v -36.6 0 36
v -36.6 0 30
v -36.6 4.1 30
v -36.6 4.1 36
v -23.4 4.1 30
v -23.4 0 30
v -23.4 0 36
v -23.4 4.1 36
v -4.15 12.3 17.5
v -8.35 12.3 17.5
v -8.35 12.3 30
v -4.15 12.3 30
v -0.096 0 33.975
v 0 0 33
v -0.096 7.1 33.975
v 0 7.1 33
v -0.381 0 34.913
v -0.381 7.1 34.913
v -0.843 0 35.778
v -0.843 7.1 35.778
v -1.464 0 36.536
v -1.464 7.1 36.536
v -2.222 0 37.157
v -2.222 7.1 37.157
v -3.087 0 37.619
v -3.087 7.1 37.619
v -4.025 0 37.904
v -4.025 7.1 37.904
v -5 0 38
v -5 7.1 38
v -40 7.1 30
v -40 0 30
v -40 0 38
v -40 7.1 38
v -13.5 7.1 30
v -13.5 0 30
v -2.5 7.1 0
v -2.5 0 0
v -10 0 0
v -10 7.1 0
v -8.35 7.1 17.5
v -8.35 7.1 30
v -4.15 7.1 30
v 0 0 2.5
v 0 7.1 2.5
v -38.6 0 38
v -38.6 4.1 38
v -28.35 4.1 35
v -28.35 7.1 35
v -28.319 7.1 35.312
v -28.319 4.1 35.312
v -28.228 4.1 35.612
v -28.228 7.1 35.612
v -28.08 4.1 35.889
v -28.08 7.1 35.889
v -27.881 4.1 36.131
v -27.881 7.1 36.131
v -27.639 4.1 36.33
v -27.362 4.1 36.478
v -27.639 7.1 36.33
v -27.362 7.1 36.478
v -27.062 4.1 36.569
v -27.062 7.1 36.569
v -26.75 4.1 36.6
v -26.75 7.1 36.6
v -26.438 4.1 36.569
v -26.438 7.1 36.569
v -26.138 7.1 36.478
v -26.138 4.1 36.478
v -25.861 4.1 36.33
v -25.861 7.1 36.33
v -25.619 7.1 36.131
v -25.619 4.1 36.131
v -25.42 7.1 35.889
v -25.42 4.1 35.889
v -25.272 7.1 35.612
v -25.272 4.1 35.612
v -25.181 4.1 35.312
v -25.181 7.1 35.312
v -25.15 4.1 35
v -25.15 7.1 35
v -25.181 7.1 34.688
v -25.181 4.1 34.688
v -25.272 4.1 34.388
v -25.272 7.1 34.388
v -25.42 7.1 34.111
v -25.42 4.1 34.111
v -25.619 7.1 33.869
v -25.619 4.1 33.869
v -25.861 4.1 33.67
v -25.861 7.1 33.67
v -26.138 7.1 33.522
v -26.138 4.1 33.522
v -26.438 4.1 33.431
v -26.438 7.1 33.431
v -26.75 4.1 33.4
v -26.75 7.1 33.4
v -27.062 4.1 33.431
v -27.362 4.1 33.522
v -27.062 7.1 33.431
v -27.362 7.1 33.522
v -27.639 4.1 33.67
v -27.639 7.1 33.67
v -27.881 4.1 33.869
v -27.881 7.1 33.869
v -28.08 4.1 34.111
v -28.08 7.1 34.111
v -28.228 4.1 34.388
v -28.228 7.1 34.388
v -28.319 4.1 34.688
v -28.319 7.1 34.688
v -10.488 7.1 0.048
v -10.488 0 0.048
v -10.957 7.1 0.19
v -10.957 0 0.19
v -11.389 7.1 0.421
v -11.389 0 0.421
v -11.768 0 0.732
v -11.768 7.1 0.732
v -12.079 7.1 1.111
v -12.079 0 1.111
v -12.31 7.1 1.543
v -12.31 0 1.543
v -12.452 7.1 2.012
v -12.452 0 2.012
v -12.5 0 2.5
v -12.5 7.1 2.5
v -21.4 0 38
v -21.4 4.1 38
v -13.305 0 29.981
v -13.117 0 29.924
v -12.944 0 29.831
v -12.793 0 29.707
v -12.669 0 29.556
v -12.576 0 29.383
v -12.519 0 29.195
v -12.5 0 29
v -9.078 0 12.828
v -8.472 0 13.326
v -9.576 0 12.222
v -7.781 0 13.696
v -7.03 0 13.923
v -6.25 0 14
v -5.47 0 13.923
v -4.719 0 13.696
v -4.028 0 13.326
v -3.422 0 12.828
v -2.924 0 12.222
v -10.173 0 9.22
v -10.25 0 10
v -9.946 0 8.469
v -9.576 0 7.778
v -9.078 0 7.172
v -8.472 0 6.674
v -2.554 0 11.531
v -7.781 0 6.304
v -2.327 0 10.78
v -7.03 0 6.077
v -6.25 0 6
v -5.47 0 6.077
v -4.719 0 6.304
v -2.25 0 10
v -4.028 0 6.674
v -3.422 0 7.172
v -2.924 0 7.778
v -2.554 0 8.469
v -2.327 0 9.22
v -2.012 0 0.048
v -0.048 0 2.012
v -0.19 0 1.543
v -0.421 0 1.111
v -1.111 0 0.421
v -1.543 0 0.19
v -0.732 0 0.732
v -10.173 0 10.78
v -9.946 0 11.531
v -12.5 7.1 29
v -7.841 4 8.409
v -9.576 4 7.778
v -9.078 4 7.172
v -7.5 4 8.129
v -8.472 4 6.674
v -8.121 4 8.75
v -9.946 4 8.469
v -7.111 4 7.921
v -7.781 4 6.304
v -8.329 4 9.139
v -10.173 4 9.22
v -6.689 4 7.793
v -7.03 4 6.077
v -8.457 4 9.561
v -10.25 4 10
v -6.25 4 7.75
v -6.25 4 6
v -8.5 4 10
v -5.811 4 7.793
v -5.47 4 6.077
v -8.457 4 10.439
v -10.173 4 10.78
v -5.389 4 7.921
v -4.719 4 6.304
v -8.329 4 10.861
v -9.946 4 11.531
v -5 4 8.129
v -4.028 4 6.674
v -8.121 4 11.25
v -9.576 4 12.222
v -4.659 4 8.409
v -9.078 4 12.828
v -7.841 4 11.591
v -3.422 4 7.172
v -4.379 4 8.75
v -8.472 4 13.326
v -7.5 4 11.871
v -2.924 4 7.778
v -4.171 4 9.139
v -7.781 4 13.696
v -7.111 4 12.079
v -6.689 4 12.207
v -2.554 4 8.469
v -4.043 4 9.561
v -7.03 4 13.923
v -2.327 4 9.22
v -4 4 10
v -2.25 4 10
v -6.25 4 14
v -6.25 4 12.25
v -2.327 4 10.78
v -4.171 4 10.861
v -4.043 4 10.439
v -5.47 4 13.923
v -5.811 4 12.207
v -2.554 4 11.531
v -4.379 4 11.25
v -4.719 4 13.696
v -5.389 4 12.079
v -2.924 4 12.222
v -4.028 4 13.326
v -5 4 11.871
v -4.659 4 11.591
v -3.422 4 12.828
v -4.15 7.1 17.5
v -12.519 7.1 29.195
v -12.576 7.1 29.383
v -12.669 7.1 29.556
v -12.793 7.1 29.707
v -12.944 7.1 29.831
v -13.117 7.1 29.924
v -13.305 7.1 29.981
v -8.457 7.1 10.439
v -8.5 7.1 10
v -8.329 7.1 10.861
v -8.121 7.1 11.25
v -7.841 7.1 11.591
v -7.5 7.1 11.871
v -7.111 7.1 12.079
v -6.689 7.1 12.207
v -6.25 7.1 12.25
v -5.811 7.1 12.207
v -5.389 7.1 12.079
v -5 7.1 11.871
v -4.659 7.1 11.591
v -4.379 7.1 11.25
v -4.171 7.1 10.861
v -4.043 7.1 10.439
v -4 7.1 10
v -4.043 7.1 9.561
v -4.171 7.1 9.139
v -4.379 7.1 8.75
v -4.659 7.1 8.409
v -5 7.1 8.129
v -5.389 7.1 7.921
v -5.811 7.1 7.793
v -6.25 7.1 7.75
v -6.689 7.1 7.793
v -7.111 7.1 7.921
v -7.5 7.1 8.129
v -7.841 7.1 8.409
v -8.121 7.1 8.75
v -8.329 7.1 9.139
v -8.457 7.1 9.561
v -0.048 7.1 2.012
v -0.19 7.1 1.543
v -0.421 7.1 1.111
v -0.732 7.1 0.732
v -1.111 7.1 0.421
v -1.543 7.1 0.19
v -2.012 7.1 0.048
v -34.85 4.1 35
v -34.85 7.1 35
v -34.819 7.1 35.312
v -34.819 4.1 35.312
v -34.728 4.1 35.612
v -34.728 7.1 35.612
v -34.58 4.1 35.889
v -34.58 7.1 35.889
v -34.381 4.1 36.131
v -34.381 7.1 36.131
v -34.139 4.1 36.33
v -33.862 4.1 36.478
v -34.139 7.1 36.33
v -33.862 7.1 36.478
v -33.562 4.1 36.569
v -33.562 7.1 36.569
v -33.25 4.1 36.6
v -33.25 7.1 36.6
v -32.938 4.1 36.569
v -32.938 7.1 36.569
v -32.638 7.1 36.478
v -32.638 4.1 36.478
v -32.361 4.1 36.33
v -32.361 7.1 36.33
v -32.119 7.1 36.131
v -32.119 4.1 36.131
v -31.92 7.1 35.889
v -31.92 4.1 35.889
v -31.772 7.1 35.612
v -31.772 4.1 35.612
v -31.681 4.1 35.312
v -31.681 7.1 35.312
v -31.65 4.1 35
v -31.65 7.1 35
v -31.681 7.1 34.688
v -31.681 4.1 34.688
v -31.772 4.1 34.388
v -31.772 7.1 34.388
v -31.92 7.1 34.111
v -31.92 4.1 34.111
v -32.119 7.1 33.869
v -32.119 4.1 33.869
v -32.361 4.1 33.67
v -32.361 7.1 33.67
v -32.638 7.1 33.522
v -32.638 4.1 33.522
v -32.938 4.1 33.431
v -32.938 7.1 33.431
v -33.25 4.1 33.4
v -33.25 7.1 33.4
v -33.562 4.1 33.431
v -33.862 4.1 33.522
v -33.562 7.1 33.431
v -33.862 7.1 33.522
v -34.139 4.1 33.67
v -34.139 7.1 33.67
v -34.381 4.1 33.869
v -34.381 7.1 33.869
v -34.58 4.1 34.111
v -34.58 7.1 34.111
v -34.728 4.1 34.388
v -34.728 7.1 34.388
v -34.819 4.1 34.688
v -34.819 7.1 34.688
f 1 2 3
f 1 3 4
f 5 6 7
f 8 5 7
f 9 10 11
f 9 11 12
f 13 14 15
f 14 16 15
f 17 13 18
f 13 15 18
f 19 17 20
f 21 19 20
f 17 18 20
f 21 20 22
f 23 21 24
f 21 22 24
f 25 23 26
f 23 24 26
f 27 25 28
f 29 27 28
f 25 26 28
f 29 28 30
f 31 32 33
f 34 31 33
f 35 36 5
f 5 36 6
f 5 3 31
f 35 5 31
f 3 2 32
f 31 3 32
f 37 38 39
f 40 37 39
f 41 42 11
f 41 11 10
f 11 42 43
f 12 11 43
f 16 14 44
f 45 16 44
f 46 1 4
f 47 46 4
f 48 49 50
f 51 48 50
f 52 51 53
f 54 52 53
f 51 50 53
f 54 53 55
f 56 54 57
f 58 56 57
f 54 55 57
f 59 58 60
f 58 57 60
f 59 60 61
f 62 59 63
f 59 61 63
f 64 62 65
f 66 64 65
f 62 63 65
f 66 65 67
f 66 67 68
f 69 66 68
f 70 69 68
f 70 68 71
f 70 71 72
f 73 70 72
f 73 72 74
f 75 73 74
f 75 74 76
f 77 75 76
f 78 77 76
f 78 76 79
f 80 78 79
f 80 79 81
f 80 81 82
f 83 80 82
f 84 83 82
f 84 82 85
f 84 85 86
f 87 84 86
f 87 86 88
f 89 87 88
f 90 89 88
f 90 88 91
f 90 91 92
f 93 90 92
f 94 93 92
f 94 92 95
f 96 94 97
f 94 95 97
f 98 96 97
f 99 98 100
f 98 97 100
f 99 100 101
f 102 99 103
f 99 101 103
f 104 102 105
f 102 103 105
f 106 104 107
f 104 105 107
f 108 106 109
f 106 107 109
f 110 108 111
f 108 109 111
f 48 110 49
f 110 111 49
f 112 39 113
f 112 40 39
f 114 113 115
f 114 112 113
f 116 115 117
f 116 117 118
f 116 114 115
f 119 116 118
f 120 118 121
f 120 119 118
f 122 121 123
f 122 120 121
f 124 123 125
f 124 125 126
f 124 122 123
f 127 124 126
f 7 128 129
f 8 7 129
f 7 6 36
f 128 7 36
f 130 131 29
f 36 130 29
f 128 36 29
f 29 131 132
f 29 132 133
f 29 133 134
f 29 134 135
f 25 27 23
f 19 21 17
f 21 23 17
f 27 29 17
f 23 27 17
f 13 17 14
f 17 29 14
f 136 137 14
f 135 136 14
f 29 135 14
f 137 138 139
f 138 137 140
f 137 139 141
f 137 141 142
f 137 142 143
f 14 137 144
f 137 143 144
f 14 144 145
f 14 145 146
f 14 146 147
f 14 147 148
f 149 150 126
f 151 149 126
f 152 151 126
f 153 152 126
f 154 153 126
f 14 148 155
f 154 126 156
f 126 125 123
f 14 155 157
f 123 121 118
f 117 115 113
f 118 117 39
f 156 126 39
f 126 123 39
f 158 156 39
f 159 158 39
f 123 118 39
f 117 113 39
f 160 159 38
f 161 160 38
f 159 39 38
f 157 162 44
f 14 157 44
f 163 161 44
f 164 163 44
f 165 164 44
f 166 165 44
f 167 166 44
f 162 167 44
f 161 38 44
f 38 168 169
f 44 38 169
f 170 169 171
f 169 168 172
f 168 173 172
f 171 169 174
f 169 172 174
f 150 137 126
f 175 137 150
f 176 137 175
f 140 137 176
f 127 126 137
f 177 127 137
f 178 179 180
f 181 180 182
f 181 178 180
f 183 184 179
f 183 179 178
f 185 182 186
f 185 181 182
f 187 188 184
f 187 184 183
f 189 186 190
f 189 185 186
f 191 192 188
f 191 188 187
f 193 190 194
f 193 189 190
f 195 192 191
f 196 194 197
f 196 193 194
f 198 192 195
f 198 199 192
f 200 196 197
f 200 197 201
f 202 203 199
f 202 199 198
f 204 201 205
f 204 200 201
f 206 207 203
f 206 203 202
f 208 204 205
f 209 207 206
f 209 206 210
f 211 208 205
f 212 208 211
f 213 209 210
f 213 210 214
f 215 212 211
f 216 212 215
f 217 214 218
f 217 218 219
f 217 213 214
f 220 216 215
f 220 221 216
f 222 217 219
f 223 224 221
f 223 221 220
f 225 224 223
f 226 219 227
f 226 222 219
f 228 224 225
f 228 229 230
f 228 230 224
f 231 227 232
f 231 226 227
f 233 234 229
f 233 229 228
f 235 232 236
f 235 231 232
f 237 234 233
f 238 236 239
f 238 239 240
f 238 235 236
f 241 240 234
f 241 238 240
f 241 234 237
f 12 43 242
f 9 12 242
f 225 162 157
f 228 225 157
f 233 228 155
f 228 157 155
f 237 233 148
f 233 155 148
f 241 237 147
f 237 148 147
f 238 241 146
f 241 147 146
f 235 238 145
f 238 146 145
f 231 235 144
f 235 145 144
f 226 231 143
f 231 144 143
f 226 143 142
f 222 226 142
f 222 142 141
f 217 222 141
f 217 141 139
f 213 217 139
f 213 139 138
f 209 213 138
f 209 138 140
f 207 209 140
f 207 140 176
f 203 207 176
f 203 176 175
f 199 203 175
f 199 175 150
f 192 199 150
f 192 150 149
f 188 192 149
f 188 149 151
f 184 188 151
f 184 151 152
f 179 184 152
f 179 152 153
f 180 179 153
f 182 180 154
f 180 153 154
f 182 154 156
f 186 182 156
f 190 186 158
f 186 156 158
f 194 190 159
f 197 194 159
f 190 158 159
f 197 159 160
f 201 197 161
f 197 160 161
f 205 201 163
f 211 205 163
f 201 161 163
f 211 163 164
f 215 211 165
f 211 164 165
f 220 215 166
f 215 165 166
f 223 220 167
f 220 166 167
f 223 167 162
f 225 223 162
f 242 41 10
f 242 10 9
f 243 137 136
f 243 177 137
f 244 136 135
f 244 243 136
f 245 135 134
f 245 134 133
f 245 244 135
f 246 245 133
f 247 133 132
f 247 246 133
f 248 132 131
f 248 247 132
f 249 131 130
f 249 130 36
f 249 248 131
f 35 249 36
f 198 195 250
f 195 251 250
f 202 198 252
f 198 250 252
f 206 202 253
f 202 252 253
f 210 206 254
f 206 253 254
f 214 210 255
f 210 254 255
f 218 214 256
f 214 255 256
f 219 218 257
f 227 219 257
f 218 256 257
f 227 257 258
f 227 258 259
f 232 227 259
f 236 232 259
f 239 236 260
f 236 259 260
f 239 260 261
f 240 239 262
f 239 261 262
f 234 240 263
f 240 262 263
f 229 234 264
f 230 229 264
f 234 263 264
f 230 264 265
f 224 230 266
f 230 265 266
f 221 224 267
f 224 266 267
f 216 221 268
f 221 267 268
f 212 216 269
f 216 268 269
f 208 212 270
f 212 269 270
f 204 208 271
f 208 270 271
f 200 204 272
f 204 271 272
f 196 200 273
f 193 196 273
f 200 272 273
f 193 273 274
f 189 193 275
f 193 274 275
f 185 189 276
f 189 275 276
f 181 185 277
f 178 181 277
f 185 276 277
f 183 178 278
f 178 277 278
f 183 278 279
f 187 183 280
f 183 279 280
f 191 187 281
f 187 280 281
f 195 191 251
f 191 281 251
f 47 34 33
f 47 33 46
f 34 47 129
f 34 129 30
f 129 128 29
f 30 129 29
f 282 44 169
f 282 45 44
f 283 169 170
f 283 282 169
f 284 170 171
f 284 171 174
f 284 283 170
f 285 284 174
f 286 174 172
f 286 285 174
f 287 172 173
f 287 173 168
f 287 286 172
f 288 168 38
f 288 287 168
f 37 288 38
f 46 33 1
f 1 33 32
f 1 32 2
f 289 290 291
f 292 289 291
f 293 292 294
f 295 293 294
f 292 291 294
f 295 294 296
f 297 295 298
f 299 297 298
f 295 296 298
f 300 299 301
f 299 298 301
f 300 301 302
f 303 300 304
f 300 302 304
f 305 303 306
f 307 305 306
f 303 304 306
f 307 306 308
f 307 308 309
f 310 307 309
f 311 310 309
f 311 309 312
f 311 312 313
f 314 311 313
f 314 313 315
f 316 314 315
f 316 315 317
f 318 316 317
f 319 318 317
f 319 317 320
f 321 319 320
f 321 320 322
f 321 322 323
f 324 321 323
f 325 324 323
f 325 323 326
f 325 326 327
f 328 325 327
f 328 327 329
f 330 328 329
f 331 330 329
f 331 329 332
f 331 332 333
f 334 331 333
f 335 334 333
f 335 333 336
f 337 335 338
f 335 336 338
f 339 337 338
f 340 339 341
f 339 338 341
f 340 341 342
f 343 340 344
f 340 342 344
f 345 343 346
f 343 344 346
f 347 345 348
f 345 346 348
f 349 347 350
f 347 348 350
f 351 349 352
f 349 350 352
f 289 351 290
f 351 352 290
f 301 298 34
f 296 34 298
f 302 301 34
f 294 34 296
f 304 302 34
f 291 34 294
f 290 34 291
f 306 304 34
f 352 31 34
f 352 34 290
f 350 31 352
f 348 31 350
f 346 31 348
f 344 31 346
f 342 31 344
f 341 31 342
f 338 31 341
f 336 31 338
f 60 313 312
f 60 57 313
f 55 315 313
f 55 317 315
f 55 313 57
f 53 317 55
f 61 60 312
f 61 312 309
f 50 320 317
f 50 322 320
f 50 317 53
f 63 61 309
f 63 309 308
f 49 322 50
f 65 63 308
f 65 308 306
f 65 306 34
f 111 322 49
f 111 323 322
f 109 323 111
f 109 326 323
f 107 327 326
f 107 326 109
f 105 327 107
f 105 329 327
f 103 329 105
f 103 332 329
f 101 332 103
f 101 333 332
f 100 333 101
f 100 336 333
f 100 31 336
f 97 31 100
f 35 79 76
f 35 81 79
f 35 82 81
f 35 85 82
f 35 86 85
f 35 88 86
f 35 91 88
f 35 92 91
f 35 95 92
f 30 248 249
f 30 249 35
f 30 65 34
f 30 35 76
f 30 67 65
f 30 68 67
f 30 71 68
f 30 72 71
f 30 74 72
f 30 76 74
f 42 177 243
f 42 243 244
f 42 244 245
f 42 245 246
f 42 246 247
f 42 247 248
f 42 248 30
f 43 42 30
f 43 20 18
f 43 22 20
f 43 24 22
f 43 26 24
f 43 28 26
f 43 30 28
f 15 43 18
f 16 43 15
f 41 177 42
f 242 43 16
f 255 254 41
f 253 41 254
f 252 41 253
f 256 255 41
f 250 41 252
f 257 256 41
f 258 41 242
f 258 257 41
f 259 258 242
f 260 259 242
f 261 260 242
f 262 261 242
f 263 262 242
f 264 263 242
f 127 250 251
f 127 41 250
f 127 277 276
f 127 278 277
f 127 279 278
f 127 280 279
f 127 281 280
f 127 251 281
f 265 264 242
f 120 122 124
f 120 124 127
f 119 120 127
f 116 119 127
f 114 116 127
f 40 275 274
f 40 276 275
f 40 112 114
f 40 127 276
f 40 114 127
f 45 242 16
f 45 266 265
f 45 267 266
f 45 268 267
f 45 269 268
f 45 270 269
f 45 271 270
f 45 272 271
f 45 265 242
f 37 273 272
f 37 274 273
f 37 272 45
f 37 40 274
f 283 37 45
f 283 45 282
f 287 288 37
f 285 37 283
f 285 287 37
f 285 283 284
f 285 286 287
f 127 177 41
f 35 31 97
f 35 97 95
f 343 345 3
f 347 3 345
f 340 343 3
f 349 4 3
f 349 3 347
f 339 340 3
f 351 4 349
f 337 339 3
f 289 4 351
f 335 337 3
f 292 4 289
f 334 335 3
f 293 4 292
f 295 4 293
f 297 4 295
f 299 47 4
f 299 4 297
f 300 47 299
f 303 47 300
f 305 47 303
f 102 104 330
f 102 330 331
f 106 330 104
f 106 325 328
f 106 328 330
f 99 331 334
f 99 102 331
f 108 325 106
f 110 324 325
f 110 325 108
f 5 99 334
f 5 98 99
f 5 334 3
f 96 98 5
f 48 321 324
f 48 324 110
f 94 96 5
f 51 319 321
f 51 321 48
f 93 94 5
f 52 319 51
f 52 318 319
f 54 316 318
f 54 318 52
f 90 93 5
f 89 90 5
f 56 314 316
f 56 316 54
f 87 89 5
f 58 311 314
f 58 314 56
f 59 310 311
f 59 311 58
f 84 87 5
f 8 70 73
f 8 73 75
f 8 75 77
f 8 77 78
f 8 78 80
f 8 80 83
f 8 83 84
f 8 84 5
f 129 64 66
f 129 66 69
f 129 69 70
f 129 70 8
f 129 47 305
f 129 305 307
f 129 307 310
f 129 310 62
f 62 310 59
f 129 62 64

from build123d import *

# Parameters (mm, degrees)
BOSS_EXTRUDE1_DEPTH            = 7.1
SKETCH2_W                      = 4.2
SKETCH2_H                      = 12.5
BOSS_EXTRUDE2_DEPTH            = 5.2
CBORE_FOR_M4_SHCS1_D           = 4.5
CBORE_FOR_M4_SHCS1_CBORE_D     = 8
CBORE_FOR_M4_SHCS1_CBORE_DEPTH = 4
F_3_2_3_2_DIAMETER_HOLE1_D     = 3.2
SKETCH7_W                      = 13.2
SKETCH7_H                      = 8
CUT_EXTRUDE1_DEPTH             = 4.1
FILLET1_R                      = 5
FILLET2_R                      = 2.5
FILLET3_R                      = 1
CHAMFER1_SIZE                  = 2


with BuildPart() as part:
    # Sketch1 → Boss-Extrude1 (new body)
    with BuildSketch(Plane(origin=(0, 0, 0), x_dir=(1, 0, 0), z_dir=(0, 1, 0))):
        Polygon((0, 0), (-12.5, 0), (-12.5, -30), (-40, -30), (-40, -38), (-12.5, -38), (0, -38), align=None)
    extrude(amount=BOSS_EXTRUDE1_DEPTH)

    # Sketch2 → Boss-Extrude2 (add)
    with BuildSketch(Plane(origin=(0, 7.1, 0), x_dir=(1, 0, 0), z_dir=(0, 1, 0))):
        with Locations((-6.25, -23.75)):
            Rectangle(SKETCH2_W, SKETCH2_H)
    extrude(amount=BOSS_EXTRUDE2_DEPTH)

    # CBORE for M4 SHCS1 (through all)
    with Locations(Plane.XZ):
        with Locations((-6.25, 10)):
            CounterBoreHole(CBORE_FOR_M4_SHCS1_D / 2, CBORE_FOR_M4_SHCS1_CBORE_D / 2, CBORE_FOR_M4_SHCS1_CBORE_DEPTH)

    # Ø3.2 (3.2) Diameter Hole1 (through all)
    with Locations(Plane.XZ):
        with Locations((-33.25, 35), (-26.75, 35)):
            Hole(F_3_2_3_2_DIAMETER_HOLE1_D / 2)

    # Sketch7 → Cut-Extrude1 (cut)
    with BuildSketch(Plane.XZ):
        with Locations((-30, 34)):
            Rectangle(SKETCH7_W, SKETCH7_H)
    extrude(amount=-CUT_EXTRUDE1_DEPTH, mode=Mode.SUBTRACT)

    # Fillet1
    fillet1_edges = [part.edges().sort_by_distance(p)[0] for p in [
        (0, 3.55, 38),
    ]]
    fillet(fillet1_edges, radius=FILLET1_R)

    # Fillet2
    fillet2_edges = [part.edges().sort_by_distance(p)[0] for p in [
        (-12.5, 3.55, 0),
        (0, 3.55, 0),
    ]]
    fillet(fillet2_edges, radius=FILLET2_R)

    # Fillet3
    fillet3_edges = [part.edges().sort_by_distance(p)[0] for p in [
        (-12.5, 3.55, 30),
    ]]
    fillet(fillet3_edges, radius=FILLET3_R)

    # Chamfer1
    chamfer1_edges = [part.edges().sort_by_distance(p)[0] for p in [
        (-23.4, 2.05, 38),
        (-36.6, 2.05, 38),
    ]]
    chamfer(chamfer1_edges, length=CHAMFER1_SIZE)


solid = part.part
